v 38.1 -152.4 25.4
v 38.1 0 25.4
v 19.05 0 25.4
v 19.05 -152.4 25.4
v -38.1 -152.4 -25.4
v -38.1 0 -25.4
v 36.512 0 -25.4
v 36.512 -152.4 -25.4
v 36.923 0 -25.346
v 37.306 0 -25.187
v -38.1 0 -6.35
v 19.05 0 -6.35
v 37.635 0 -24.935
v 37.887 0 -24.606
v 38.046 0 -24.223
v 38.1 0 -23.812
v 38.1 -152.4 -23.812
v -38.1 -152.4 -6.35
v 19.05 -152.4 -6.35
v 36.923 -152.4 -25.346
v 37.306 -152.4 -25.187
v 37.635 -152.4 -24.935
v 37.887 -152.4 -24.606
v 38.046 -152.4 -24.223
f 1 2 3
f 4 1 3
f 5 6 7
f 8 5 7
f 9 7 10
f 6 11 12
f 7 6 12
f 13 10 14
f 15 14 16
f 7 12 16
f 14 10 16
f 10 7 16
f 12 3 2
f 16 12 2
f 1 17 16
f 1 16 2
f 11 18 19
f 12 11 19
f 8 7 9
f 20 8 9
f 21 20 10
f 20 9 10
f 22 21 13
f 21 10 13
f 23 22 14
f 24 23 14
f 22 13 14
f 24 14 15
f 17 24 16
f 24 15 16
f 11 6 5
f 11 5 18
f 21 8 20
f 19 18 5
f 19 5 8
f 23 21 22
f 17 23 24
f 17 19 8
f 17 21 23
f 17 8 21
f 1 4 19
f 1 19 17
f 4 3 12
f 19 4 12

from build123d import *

# Parameters (mm, degrees)
F0_W     = 57.15
F0_H     = 19.05
F1_DEPTH = 152.4


with BuildPart() as f1:
    # F0 (on Front) → F1 (new body)
    with BuildSketch(Plane.XZ):
        with Locations((-9.525, -15.875)):
            Rectangle(F0_W, F0_H)
        with BuildLine():
            ThreePointArc((36.5125, -25.4), (37.635032, -24.935032), (38.1, -23.8125))
            Line((38.1, -23.8125), (38.1, 25.4))
            Line((38.1, 25.4), (19.05, 25.4))
            Line((19.05, 25.4), (19.05, -6.35))
            Line((19.05, -6.35), (19.05, -25.4))
            Line((19.05, -25.4), (36.5125, -25.4))
        make_face()
    extrude(amount=F1_DEPTH)


solid = f1.part
